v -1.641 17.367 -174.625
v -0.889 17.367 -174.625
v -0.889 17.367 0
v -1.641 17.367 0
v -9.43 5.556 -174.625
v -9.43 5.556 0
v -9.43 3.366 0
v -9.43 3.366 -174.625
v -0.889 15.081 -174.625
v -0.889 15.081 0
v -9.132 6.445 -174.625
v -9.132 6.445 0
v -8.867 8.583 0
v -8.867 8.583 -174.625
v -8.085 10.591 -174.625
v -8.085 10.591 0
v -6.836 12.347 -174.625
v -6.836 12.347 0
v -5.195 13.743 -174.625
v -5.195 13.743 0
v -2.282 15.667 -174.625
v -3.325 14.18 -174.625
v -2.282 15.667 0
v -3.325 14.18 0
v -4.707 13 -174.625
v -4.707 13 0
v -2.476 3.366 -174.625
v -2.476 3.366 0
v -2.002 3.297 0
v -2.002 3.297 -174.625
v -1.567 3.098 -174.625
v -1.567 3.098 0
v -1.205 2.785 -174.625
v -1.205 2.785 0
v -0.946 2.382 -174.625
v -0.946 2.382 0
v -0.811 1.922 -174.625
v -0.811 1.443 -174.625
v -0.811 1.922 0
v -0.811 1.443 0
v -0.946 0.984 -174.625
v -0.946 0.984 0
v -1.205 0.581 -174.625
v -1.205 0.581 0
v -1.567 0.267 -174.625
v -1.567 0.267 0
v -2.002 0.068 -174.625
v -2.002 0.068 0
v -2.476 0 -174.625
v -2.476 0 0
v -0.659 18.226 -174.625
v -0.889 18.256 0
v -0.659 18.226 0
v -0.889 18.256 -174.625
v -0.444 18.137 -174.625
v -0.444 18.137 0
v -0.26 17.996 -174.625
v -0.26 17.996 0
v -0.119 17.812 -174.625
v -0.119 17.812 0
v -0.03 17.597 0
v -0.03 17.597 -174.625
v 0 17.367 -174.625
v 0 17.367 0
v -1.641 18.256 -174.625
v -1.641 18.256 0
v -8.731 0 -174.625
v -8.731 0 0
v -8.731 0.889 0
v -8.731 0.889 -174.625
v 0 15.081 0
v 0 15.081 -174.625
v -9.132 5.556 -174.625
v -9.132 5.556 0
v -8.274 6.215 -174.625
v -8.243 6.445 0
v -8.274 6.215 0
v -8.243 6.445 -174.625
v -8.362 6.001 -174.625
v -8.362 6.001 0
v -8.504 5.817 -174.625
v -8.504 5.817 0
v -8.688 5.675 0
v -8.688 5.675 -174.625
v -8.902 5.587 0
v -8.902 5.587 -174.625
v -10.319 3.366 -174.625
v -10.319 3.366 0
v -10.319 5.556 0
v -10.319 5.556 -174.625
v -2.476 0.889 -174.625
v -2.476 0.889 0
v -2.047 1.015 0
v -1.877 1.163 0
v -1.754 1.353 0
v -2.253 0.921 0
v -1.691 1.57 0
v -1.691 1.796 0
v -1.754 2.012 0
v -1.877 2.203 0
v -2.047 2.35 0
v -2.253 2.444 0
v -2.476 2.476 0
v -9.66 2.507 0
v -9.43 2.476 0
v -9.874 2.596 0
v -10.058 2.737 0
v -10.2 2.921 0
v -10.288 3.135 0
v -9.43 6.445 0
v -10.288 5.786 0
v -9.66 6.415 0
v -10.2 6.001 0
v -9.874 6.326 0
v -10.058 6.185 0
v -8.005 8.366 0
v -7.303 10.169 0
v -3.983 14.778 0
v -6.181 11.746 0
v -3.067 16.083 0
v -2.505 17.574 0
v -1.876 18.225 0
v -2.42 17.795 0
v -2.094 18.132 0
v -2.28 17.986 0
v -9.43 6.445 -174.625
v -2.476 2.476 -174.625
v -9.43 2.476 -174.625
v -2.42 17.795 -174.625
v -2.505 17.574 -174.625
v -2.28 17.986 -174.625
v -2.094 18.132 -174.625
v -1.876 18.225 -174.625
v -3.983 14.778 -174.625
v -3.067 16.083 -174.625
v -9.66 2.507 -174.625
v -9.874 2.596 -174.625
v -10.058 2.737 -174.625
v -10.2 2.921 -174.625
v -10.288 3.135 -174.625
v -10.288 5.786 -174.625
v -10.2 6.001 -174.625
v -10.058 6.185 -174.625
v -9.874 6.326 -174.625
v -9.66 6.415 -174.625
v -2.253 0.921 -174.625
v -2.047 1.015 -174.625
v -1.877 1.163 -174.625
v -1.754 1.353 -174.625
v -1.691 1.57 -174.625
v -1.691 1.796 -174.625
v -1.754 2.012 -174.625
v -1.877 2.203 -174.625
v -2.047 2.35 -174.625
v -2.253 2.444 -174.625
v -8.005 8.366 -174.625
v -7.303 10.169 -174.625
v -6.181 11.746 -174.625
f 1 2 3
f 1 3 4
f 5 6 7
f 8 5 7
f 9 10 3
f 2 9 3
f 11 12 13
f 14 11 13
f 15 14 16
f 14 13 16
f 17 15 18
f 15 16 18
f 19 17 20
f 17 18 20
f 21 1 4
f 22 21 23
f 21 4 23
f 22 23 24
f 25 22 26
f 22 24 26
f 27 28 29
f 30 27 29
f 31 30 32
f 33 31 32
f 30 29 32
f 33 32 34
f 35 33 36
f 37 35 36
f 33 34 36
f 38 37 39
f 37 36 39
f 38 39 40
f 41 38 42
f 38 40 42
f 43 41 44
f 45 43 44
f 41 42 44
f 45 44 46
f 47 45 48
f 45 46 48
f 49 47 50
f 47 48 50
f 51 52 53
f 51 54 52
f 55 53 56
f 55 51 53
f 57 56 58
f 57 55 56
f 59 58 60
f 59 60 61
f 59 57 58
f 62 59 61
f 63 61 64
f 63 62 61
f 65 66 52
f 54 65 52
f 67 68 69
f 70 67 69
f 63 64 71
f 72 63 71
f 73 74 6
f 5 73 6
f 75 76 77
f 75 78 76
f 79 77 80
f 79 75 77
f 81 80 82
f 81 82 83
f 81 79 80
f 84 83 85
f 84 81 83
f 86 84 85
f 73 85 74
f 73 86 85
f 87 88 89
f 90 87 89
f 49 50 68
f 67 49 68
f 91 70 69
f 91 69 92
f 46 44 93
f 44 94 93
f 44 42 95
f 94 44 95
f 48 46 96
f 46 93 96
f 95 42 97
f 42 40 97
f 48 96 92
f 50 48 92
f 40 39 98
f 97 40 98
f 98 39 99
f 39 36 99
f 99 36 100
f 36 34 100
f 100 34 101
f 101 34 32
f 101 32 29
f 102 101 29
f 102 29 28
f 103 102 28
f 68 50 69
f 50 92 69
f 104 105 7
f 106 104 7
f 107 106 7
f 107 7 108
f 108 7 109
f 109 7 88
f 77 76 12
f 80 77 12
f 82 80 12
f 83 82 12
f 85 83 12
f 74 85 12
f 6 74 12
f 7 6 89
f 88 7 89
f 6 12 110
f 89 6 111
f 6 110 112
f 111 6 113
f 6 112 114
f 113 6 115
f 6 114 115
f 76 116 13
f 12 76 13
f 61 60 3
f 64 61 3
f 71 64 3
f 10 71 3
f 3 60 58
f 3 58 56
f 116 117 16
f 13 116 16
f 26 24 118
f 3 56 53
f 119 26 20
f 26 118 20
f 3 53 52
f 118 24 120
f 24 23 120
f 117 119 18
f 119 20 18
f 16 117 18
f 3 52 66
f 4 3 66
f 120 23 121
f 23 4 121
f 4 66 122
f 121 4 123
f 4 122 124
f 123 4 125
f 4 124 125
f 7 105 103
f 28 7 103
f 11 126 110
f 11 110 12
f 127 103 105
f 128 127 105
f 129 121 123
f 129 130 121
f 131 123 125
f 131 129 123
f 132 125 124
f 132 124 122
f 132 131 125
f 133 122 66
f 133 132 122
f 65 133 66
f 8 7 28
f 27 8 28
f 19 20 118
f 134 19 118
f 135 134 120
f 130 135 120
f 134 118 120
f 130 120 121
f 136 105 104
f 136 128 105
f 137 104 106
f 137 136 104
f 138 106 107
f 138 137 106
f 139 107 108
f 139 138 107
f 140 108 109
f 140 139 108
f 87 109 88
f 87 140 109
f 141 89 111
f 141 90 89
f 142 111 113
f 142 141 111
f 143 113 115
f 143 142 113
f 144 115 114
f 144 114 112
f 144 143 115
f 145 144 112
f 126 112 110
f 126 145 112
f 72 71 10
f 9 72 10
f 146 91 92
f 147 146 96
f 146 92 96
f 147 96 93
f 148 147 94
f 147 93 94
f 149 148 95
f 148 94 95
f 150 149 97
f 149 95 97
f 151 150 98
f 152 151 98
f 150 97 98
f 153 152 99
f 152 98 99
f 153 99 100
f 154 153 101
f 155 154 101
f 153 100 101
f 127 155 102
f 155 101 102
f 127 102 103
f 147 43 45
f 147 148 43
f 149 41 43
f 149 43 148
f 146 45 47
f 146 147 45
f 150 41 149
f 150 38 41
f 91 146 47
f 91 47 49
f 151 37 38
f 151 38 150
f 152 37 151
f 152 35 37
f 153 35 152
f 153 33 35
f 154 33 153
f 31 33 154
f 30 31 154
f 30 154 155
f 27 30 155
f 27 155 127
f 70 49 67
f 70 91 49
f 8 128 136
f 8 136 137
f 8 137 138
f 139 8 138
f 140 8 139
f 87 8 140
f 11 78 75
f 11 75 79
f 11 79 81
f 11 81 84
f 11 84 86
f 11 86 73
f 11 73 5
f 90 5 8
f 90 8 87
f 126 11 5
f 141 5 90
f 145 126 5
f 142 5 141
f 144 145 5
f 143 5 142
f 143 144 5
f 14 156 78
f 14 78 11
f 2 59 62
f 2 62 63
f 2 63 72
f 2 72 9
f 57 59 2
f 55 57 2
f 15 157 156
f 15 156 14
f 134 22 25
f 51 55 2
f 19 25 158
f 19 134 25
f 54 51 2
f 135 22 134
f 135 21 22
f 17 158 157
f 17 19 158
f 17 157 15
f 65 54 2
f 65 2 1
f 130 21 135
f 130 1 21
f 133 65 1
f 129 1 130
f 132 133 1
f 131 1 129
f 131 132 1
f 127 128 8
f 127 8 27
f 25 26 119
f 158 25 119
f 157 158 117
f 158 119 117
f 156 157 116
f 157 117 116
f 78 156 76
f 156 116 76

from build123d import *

# Parameters (mm, degrees)
BOSS_EXTRUDE1_DEPTH = 174.625
FILLET1_R           = 0.889


with BuildPart() as part:
    # Sketch1 → Boss-Extrude1 (new body)
    with BuildSketch(Plane.XY):
        with BuildLine():
            Line((-0.889, 15.08125), (-0.889, 17.36725))
            Line((-0.889, 17.36725), (-1.640744106, 17.36725))
            ThreePointArc((-1.640744106, 17.36725), (-2.756675468, 14.890646285), (-4.706872009, 12.99972))
            ThreePointArc((-4.706872009, 12.99972), (-7.503098361, 9.771250732), (-8.192782673, 5.55625))
            Line((-8.192782673, 5.55625), (-9.42975, 5.55625))
            Line((-9.42975, 5.55625), (-9.42975, 3.3655))
            Line((-9.42975, 3.3655), (-2.4765, 3.3655))
            ThreePointArc((-2.4765, 3.3655), (-0.79375, 1.68275), (-2.4765, 0))
            Line((-2.4765, 0), (-8.73125, 0))
            Line((-8.73125, 0), (-8.73125, 0.889))
            Line((-8.73125, 0.889), (-2.4765, 0.889))
            ThreePointArc((-2.4765, 0.889), (-1.68275, 1.68275), (-2.4765, 2.4765))
            Line((-2.4765, 2.4765), (-10.31875, 2.4765))
            Line((-10.31875, 2.4765), (-10.31875, 6.44525))
            Line((-10.31875, 6.44525), (-9.132334267, 6.44525))
            ThreePointArc((-9.132334267, 6.44525), (-8.085204479, 10.59121468), (-5.194977502, 13.742736842))
            ThreePointArc((-5.194977502, 13.742736842), (-3.292786478, 15.690706026), (-2.38125, 18.25625))
            Line((-2.38125, 18.25625), (0, 18.25625))
            Line((0, 18.25625), (0, 15.08125))
            Line((0, 15.08125), (-0.889, 15.08125))
        make_face()
    extrude(amount=-BOSS_EXTRUDE1_DEPTH)

    # Fillet1
    fillet1_edges = [part.edges().sort_by_distance(p)[0] for p in [
        (-8.192782673, 5.55625, -87.3125),
        (-10.31875, 2.4765, -87.3125),
        (-10.31875, 6.44525, -87.3125),
        (-2.38125, 18.25625, -87.3125),
        (0, 18.25625, -87.3125),
    ]]
    fillet(fillet1_edges, radius=FILLET1_R)


solid = part.part
